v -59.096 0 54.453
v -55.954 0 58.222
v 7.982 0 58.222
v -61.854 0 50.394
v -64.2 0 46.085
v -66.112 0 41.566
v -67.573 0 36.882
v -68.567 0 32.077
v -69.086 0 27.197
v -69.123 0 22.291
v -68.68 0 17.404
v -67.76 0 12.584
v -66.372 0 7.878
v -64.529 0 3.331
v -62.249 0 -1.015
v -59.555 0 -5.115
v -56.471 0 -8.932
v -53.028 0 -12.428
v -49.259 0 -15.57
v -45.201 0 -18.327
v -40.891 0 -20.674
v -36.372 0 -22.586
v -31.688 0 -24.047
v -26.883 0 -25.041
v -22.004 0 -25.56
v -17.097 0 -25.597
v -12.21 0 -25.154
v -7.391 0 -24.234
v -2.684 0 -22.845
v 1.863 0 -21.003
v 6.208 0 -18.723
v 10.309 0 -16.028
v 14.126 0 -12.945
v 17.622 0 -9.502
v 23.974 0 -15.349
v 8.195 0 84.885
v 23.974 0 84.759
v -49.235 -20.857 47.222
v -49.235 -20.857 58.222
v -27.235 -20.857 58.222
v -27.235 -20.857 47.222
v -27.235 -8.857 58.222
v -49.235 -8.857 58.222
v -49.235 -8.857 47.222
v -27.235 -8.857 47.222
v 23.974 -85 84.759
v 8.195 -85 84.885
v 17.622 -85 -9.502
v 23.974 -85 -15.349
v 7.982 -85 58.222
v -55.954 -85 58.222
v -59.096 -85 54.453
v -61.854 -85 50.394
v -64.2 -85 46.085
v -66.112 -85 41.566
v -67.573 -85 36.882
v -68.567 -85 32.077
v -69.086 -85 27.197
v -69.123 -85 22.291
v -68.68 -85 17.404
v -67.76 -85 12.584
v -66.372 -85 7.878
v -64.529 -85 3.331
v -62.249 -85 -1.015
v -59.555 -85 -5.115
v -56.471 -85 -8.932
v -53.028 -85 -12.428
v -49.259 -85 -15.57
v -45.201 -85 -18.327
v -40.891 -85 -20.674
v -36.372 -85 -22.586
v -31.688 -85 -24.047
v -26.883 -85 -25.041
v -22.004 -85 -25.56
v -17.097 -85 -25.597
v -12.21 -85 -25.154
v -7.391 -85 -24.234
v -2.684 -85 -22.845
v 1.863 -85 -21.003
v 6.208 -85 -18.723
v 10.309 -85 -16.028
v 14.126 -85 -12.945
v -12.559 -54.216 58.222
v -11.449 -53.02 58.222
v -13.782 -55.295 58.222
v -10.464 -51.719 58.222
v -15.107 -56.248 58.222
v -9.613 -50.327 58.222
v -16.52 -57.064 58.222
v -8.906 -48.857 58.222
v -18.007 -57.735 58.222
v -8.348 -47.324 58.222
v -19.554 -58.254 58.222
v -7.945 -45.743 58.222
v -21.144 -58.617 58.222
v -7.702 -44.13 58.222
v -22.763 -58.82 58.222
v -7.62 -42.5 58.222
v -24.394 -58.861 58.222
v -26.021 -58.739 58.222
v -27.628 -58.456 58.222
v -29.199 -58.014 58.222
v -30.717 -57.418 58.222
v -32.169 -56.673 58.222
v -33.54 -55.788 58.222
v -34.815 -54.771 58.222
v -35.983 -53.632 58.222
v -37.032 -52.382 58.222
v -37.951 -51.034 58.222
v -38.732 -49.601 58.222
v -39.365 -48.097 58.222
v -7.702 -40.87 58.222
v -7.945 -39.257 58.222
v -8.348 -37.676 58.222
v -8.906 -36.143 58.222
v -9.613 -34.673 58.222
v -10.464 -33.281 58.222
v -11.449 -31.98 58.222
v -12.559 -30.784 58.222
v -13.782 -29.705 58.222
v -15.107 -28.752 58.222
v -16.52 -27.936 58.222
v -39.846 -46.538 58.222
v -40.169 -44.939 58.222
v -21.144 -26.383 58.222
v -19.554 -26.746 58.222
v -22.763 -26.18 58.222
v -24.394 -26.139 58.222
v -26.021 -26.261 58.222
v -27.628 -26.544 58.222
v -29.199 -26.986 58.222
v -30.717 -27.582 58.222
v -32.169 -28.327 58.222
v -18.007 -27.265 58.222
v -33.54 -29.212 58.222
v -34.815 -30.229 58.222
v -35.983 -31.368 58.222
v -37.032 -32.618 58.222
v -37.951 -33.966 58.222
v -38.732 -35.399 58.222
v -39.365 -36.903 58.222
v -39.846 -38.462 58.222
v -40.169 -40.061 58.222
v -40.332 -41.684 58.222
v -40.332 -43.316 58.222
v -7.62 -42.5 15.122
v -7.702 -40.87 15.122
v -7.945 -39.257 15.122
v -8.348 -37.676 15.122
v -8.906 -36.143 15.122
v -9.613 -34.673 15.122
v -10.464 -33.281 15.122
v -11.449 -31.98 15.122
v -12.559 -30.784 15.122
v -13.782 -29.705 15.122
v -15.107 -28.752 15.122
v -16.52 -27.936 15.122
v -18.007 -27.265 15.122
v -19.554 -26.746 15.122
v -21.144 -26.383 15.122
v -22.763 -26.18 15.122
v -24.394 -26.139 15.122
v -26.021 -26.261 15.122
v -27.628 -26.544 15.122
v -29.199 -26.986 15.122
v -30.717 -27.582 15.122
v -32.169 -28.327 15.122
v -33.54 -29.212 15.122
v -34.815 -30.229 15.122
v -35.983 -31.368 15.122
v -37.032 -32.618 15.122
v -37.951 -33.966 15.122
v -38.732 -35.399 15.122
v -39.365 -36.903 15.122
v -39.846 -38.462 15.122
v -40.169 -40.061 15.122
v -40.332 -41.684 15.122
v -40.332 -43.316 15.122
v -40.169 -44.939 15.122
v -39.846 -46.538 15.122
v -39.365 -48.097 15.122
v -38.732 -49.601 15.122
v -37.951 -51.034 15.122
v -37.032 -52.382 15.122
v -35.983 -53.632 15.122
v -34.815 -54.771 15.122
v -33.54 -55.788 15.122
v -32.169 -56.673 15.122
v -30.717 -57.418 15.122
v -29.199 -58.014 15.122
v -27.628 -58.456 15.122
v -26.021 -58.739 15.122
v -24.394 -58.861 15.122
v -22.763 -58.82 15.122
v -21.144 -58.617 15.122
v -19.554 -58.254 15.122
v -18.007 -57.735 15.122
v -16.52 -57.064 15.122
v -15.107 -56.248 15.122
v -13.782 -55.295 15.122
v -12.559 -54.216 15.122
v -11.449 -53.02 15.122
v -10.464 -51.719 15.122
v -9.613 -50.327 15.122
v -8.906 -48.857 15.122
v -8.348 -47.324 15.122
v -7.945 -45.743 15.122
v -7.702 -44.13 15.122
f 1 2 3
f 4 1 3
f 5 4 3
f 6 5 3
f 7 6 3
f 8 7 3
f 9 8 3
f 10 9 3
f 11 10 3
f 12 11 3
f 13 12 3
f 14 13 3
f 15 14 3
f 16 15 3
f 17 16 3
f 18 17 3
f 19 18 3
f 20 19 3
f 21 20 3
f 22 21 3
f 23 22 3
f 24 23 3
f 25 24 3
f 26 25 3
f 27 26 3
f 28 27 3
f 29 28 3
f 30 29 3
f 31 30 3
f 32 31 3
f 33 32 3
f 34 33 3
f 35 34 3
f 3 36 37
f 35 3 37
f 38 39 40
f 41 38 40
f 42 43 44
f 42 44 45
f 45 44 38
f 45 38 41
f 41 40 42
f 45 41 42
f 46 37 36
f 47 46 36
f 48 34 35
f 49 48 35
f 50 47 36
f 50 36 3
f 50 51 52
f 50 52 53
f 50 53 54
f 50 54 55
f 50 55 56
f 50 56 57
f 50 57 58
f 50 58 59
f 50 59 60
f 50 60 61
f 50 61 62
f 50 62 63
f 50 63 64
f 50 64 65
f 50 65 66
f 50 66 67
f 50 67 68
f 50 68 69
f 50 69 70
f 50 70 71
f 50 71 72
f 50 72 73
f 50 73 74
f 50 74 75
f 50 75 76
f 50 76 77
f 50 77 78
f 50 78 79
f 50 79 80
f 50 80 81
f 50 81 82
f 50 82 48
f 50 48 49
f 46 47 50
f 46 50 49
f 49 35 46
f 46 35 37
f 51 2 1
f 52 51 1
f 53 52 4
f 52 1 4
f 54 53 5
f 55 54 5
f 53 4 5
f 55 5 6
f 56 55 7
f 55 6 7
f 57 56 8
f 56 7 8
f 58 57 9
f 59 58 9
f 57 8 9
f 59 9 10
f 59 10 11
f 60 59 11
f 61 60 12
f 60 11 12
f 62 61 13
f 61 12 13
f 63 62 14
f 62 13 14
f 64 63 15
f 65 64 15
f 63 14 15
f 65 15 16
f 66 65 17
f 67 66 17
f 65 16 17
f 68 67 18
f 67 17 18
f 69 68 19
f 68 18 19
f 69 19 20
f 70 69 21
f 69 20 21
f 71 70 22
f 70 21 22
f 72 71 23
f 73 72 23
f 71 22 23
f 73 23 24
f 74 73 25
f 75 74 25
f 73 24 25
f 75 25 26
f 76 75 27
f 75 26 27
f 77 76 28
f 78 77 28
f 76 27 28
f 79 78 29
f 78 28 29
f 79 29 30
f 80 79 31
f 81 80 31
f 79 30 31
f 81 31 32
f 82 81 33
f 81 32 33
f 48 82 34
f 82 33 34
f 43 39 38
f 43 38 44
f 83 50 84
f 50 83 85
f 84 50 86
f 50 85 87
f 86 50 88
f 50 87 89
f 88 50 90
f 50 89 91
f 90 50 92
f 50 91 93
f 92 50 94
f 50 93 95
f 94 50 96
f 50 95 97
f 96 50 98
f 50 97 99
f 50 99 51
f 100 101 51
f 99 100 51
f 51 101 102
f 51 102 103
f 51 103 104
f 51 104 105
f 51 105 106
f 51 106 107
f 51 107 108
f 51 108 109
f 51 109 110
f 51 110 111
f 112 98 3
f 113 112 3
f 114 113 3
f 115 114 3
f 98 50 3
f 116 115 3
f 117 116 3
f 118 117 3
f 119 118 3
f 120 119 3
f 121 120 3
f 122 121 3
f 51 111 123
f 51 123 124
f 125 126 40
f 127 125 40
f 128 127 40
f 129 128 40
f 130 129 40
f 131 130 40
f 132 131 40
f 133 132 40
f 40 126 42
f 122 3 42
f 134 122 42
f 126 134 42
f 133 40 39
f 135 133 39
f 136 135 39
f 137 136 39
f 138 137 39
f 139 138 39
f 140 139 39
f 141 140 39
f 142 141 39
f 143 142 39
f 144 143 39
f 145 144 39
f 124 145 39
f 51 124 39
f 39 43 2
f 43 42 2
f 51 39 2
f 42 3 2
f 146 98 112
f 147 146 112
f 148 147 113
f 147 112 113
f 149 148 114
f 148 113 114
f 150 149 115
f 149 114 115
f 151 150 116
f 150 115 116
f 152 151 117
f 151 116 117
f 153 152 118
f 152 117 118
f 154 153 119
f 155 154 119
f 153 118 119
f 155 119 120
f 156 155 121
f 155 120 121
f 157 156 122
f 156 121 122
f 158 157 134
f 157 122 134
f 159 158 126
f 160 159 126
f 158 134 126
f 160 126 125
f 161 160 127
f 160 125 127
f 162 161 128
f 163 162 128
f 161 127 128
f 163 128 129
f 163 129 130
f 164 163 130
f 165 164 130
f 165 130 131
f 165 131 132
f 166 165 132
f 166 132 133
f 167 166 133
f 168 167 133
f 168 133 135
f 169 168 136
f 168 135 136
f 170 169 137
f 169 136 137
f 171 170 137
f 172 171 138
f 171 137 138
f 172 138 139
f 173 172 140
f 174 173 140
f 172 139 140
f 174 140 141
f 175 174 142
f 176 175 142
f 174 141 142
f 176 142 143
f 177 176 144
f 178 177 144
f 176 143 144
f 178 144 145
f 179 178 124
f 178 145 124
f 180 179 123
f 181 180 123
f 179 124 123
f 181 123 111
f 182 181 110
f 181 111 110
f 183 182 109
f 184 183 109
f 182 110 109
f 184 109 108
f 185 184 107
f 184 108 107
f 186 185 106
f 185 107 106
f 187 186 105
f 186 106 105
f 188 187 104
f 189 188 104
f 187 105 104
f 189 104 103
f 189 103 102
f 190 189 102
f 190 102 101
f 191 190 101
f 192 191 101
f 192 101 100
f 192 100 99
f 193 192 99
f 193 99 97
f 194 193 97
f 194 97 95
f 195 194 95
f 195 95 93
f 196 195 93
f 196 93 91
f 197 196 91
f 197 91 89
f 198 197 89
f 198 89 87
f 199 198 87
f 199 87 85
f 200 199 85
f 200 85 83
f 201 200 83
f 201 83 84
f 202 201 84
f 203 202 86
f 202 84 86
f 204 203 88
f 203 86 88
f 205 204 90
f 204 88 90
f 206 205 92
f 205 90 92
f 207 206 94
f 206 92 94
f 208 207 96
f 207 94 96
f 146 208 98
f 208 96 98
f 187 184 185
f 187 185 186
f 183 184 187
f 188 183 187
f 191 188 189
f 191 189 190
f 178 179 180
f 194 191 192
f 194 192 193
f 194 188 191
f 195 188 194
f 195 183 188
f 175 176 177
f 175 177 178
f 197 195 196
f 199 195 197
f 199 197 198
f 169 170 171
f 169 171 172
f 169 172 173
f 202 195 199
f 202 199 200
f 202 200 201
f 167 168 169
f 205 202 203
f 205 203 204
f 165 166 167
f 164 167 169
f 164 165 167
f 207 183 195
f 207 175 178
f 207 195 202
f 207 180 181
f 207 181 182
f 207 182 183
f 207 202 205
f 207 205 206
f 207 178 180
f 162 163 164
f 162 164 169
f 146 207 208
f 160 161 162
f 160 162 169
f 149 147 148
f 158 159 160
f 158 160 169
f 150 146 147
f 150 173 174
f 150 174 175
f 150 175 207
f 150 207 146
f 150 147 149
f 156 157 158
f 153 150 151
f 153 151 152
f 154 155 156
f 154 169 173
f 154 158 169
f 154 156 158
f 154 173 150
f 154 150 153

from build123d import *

# Parameters (mm, degrees)
F1_DEPTH = 85
F2_R     = 16.36591
F3_DEPTH = 43.1
F4_W     = 22
F4_H     = 12
F5_DEPTH = 11


with BuildPart() as f1:
    # F0 (on Front) → F1 (new body)
    with BuildSketch(Plane.XZ):
        with BuildLine():
            ThreePointArc((-55.954337, 58.221886), (-53.02819, -12.428221), (17.621917, -9.502074))
            Line((17.621917, -9.502074), (23.973947, -15.34886))
            Line((23.973947, -15.34886), (23.973947, 84.758947))
            Line((23.973947, 84.758947), (8.195213, 84.885334))
            Line((8.195213, 84.885334), (7.981639, 58.221886))
            Line((7.981639, 58.221886), (-55.954337, 58.221886))
        make_face()
    extrude(amount=F1_DEPTH)

    # F2 (on face) → F3 (cut)
    with BuildSketch(Plane.XY.offset(58.221886)):
        with Locations((-23.986349, -42.5)):
            Circle(F2_R)
    extrude(amount=-F3_DEPTH, mode=Mode.SUBTRACT)

    # F4 (on face) → F5 (cut)
    with BuildSketch(Plane.XY.offset(58.221886)):
        with Locations((-38.234517, -14.8571)):
            Rectangle(F4_W, F4_H)
    extrude(amount=-F5_DEPTH, mode=Mode.SUBTRACT)


solid = f1.part
